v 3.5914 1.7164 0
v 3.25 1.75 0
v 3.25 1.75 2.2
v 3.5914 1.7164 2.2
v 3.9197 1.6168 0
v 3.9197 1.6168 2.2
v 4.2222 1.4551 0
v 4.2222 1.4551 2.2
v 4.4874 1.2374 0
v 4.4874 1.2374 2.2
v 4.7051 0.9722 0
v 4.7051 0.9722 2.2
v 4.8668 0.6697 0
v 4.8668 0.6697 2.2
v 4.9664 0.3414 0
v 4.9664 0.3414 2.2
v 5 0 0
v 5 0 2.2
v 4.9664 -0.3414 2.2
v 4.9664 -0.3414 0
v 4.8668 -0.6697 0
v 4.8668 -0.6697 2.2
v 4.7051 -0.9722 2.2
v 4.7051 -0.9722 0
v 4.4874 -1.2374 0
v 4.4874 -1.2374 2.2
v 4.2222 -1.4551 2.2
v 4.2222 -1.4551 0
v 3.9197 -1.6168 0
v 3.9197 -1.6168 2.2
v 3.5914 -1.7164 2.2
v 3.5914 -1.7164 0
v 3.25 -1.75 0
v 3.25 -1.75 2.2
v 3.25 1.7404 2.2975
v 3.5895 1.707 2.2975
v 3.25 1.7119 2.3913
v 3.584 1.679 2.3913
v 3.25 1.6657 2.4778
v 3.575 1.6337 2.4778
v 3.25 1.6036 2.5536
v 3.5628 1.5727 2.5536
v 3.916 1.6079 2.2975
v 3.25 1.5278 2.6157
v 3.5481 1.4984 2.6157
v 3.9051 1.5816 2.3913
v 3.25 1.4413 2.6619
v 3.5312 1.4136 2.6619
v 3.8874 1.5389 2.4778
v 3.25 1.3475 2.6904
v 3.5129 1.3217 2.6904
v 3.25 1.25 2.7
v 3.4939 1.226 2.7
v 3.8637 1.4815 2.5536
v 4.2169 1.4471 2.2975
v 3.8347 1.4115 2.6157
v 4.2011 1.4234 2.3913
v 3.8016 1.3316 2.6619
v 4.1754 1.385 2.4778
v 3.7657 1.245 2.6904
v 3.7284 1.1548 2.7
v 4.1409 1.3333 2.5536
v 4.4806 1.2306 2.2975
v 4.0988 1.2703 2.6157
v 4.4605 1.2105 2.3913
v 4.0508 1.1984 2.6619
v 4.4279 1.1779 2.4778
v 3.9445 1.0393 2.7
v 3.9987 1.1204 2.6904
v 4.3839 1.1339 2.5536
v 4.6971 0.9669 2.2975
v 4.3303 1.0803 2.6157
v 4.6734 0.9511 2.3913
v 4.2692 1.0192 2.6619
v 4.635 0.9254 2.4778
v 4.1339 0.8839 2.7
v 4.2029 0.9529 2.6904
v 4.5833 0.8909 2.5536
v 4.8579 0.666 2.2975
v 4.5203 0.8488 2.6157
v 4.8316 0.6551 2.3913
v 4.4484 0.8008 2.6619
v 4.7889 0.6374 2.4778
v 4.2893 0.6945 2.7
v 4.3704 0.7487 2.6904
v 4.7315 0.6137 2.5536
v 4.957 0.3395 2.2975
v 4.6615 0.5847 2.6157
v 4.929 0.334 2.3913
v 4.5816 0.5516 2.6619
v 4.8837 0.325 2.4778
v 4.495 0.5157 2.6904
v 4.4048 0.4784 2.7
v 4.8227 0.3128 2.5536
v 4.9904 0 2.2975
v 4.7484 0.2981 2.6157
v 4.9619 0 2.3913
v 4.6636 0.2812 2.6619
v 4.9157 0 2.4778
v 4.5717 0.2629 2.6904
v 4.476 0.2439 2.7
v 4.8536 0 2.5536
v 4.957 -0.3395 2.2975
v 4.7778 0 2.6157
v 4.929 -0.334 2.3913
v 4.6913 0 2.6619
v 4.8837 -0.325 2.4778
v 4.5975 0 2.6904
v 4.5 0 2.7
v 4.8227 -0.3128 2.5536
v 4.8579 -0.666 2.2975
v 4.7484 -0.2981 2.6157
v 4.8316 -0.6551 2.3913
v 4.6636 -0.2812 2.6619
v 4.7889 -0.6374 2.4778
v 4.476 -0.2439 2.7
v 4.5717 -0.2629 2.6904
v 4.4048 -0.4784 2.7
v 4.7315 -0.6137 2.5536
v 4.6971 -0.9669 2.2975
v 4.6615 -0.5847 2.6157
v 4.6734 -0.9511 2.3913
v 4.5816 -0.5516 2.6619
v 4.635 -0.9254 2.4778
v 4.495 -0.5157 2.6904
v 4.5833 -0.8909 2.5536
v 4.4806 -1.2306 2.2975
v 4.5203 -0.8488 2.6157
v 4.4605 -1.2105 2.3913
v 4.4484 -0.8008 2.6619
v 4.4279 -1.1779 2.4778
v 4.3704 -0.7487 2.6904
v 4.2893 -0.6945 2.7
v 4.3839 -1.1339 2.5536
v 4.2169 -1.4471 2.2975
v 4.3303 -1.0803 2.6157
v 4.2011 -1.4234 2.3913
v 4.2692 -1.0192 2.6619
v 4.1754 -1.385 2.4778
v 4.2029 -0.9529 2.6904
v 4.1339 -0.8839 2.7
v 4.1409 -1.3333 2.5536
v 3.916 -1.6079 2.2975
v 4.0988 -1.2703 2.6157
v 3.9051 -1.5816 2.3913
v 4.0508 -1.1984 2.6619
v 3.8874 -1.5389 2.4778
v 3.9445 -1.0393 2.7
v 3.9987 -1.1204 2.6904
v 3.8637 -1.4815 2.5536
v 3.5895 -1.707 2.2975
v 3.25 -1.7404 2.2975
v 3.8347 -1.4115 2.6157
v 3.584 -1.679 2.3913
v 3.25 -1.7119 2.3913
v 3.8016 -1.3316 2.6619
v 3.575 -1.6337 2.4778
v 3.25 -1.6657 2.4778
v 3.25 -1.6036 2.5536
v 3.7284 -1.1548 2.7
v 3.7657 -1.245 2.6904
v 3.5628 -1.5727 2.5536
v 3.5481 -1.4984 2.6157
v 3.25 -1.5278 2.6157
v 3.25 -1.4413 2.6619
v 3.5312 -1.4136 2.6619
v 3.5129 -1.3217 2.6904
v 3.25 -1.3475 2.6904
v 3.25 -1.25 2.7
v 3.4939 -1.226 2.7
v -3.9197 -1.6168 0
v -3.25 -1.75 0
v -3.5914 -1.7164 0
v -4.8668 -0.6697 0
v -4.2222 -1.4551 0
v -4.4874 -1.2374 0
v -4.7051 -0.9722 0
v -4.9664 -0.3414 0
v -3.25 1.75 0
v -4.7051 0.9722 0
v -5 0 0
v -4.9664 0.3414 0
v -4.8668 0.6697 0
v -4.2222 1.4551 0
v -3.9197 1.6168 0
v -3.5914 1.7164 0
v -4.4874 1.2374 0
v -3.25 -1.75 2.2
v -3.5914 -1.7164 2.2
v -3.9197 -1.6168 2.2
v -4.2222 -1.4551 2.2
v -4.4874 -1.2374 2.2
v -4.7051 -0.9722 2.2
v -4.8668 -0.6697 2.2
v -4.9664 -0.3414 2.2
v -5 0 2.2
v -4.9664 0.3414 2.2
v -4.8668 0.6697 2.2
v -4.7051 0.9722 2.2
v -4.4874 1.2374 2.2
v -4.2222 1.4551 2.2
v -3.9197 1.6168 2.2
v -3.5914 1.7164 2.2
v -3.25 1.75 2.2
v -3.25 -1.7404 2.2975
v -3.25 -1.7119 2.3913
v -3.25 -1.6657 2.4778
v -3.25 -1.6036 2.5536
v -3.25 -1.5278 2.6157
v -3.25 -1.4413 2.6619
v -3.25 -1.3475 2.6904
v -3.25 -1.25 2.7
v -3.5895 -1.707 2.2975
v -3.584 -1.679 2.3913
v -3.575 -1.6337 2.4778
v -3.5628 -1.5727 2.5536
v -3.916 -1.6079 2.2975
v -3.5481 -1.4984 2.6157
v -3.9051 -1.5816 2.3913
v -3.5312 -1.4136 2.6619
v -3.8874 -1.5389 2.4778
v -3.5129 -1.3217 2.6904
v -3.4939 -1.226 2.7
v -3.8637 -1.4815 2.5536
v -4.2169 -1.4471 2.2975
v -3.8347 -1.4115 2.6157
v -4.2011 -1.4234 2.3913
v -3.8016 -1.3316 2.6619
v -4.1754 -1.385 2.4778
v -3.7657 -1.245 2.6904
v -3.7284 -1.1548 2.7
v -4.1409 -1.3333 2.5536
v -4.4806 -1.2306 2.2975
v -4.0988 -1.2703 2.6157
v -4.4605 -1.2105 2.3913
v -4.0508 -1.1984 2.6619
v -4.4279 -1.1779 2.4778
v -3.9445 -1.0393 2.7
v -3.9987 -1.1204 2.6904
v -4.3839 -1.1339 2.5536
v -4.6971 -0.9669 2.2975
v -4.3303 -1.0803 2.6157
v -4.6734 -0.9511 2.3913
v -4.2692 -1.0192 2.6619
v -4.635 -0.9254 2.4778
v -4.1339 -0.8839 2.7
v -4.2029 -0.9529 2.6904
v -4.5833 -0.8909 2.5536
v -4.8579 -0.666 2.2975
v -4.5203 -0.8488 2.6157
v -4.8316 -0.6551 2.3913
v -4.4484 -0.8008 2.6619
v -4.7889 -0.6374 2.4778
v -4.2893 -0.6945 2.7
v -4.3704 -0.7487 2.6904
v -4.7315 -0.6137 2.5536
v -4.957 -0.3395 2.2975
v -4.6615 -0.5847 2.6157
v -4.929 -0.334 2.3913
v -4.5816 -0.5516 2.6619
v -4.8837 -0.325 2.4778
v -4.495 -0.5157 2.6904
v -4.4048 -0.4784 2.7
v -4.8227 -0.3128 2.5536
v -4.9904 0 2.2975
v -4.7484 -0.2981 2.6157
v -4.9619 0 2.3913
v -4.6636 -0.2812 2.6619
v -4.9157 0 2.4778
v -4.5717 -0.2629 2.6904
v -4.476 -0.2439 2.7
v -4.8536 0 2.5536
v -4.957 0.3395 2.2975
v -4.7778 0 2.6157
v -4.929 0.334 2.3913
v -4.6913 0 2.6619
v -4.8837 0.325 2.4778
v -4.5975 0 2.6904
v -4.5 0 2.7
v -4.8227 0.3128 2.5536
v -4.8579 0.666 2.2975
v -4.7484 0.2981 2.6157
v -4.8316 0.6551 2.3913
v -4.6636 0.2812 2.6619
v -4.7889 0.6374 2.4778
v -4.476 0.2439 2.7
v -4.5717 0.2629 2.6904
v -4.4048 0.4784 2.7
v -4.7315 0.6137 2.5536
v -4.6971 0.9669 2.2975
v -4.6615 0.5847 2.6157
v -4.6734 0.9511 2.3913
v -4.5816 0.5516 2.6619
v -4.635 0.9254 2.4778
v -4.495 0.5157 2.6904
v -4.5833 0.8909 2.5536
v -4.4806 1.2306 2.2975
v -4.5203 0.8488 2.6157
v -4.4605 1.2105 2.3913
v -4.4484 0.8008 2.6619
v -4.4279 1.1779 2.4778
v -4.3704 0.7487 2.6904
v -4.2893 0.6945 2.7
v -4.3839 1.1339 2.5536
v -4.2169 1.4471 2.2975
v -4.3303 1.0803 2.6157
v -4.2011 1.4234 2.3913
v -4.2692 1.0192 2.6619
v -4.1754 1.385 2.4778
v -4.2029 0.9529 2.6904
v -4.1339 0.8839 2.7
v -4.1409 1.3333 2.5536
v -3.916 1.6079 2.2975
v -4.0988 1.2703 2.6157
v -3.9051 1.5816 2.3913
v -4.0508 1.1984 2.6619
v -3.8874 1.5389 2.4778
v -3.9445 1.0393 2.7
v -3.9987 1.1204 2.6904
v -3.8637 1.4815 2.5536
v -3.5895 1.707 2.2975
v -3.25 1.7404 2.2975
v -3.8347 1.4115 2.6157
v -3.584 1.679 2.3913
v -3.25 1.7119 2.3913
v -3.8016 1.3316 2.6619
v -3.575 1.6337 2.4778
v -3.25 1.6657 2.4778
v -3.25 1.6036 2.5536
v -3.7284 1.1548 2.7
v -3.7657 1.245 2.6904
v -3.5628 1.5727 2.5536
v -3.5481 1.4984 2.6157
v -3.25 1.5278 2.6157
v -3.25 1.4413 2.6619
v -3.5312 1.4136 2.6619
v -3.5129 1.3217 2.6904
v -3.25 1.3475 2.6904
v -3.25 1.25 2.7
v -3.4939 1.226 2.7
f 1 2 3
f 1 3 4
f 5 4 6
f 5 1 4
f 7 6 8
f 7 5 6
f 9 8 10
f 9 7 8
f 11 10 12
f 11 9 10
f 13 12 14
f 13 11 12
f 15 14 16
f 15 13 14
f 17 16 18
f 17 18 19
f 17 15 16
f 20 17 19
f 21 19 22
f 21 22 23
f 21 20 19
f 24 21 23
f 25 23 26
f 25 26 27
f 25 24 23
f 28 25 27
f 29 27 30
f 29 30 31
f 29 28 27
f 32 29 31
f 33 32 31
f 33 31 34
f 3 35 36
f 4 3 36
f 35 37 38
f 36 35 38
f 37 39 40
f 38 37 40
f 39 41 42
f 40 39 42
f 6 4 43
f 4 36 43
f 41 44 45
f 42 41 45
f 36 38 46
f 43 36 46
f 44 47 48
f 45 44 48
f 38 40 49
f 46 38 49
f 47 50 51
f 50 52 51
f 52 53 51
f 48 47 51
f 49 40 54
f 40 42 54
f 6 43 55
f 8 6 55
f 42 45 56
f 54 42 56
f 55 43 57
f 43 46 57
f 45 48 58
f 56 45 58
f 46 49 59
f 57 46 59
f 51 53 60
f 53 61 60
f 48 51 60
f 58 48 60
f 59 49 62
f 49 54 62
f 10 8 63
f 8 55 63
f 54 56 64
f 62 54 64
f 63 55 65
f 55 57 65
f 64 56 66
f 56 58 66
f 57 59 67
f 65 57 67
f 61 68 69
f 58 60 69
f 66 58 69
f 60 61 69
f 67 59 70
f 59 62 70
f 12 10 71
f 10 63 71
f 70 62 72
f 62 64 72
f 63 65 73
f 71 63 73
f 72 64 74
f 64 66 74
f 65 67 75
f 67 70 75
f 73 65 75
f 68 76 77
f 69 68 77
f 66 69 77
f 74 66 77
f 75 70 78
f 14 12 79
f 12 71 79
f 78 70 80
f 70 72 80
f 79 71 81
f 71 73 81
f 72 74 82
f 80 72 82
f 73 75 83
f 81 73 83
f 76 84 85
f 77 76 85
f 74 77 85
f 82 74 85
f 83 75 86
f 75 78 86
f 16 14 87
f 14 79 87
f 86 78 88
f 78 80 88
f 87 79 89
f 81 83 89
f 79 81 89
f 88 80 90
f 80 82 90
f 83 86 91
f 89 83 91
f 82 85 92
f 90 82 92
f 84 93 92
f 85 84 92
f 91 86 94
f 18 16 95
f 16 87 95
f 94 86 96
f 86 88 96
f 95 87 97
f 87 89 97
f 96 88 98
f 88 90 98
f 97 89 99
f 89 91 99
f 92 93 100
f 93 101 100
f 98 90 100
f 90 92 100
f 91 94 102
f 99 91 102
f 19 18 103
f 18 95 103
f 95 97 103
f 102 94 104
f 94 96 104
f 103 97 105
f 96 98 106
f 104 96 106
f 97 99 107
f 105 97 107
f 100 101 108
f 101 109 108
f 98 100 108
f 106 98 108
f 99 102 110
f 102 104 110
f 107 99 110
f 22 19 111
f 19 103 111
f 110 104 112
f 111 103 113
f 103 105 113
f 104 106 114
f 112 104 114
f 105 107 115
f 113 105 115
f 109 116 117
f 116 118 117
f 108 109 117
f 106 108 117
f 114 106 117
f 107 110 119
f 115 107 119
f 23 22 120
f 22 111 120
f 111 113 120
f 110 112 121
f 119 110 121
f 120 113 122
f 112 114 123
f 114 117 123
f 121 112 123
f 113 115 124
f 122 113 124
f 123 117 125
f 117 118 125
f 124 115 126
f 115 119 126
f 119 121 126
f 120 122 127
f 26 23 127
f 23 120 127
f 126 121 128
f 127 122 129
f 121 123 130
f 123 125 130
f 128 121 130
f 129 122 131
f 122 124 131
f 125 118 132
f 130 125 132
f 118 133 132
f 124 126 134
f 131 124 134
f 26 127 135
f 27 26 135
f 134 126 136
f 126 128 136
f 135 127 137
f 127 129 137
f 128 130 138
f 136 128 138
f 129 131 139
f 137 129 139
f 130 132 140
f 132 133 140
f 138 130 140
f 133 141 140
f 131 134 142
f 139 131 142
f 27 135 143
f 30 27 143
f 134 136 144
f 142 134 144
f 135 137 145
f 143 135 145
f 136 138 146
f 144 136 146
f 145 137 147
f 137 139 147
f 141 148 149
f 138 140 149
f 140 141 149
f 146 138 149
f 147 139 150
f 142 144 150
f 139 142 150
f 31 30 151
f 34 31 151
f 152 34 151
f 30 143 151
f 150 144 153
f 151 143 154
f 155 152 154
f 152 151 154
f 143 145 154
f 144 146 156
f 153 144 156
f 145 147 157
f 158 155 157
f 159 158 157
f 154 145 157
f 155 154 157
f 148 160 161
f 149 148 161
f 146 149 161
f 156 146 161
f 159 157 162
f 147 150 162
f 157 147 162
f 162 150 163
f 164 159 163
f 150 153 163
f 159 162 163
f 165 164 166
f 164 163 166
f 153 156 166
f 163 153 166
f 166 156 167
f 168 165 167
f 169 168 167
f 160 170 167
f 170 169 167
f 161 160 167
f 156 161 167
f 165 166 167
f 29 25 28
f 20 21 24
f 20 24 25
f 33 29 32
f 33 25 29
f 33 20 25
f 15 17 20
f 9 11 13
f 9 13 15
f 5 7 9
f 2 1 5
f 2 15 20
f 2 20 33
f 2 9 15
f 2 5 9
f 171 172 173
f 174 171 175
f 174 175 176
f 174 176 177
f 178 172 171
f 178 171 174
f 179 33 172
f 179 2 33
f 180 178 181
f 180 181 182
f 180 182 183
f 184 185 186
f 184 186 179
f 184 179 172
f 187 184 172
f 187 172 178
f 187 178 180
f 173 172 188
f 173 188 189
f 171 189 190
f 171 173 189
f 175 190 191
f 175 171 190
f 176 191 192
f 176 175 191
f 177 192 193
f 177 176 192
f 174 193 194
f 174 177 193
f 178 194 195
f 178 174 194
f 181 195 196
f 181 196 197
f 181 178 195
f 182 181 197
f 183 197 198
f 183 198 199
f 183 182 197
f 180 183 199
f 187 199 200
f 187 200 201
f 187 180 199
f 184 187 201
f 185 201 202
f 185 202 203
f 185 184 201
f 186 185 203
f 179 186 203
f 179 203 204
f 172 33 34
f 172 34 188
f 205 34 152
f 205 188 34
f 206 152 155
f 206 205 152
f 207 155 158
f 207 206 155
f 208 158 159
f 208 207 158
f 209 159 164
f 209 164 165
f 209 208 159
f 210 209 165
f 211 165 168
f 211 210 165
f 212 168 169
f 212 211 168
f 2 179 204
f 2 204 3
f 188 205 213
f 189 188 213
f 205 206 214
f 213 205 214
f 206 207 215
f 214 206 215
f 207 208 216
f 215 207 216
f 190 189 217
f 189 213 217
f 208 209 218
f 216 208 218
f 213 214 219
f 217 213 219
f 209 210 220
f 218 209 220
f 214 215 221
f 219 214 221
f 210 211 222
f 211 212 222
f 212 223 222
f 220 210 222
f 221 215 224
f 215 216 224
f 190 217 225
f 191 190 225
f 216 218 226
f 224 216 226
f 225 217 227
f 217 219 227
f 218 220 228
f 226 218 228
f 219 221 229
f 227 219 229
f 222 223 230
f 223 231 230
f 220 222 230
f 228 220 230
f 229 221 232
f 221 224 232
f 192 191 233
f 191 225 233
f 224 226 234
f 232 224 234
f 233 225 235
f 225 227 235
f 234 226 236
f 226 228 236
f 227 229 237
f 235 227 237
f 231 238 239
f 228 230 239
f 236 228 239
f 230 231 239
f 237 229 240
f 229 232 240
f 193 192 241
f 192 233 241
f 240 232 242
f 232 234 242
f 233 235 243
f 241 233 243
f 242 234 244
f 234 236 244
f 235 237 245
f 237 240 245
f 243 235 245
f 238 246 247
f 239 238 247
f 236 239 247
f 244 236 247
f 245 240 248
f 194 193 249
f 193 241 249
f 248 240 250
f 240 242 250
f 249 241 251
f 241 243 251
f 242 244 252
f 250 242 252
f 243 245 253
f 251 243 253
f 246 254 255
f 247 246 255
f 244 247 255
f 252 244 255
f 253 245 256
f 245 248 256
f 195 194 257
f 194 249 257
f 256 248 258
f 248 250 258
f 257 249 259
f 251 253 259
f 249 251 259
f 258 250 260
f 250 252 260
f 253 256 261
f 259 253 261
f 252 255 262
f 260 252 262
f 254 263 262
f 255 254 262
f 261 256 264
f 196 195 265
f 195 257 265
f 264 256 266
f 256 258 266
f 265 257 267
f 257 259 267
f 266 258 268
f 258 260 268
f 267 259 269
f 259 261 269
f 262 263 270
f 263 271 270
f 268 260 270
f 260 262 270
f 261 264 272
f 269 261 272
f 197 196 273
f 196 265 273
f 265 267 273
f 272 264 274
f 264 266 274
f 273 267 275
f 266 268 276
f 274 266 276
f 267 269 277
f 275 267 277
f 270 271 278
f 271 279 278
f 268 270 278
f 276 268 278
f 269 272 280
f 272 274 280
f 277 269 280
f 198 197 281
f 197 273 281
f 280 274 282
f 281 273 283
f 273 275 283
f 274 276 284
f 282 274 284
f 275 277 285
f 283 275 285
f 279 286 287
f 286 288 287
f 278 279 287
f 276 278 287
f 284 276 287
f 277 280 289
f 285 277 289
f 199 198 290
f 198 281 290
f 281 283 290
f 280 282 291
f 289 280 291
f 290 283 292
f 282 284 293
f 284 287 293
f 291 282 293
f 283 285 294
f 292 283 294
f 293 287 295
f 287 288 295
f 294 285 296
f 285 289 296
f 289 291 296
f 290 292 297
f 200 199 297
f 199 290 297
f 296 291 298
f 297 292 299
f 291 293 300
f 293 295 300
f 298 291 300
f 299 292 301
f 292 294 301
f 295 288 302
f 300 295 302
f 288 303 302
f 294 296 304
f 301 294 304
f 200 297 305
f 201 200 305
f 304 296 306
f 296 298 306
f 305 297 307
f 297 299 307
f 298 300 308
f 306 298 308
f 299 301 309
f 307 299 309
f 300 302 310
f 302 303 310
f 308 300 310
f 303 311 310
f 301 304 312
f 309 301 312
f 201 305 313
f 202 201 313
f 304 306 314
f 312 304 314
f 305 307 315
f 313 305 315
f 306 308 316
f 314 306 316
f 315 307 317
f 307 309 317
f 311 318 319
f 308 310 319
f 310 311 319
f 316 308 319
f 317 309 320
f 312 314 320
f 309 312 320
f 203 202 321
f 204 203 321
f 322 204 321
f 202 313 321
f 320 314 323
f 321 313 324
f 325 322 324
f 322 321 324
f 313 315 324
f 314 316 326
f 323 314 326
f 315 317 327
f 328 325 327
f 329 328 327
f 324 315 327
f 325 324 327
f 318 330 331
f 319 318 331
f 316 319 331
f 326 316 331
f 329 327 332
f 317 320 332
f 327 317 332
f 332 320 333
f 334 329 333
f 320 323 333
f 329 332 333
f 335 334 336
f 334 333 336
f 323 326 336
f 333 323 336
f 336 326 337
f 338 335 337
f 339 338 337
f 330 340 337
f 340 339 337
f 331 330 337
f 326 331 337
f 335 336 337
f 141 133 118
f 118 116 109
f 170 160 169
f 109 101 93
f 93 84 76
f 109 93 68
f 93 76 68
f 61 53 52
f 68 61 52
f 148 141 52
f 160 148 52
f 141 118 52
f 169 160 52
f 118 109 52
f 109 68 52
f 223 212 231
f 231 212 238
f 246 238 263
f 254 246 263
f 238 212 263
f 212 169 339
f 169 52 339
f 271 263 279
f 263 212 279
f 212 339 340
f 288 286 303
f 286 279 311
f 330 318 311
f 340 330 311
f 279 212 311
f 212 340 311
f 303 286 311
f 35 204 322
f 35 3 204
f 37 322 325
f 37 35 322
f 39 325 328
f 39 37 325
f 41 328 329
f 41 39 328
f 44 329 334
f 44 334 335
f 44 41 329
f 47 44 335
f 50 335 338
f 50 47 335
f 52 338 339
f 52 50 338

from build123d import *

# Parameters (mm, degrees)
BOSS_EXTRUDE1_DEPTH = 2.7
FILLET1_R           = 0.5


with BuildPart() as part:
    # Sketch1 → Boss-Extrude1 (new body)
    with BuildSketch(Plane.XY):
        with BuildLine():
            Line((-3.25, 1.75), (3.25, 1.75))
            ThreePointArc((3.25, 1.75), (5, 0), (3.25, -1.75))
            Line((3.25, -1.75), (-3.25, -1.75))
            ThreePointArc((-3.25, -1.75), (-5, 0), (-3.25, 1.75))
        make_face()
    extrude(amount=BOSS_EXTRUDE1_DEPTH)

    # Fillet1
    fillet1_edges = [part.edges().sort_by_distance(p)[0] for p in [
        (5, 0, 2.7),
        (0, 1.75, 2.7),
        (-5, 0, 2.7),
        (0, -1.75, 2.7),
    ]]
    fillet(fillet1_edges, radius=FILLET1_R)


solid = part.part
